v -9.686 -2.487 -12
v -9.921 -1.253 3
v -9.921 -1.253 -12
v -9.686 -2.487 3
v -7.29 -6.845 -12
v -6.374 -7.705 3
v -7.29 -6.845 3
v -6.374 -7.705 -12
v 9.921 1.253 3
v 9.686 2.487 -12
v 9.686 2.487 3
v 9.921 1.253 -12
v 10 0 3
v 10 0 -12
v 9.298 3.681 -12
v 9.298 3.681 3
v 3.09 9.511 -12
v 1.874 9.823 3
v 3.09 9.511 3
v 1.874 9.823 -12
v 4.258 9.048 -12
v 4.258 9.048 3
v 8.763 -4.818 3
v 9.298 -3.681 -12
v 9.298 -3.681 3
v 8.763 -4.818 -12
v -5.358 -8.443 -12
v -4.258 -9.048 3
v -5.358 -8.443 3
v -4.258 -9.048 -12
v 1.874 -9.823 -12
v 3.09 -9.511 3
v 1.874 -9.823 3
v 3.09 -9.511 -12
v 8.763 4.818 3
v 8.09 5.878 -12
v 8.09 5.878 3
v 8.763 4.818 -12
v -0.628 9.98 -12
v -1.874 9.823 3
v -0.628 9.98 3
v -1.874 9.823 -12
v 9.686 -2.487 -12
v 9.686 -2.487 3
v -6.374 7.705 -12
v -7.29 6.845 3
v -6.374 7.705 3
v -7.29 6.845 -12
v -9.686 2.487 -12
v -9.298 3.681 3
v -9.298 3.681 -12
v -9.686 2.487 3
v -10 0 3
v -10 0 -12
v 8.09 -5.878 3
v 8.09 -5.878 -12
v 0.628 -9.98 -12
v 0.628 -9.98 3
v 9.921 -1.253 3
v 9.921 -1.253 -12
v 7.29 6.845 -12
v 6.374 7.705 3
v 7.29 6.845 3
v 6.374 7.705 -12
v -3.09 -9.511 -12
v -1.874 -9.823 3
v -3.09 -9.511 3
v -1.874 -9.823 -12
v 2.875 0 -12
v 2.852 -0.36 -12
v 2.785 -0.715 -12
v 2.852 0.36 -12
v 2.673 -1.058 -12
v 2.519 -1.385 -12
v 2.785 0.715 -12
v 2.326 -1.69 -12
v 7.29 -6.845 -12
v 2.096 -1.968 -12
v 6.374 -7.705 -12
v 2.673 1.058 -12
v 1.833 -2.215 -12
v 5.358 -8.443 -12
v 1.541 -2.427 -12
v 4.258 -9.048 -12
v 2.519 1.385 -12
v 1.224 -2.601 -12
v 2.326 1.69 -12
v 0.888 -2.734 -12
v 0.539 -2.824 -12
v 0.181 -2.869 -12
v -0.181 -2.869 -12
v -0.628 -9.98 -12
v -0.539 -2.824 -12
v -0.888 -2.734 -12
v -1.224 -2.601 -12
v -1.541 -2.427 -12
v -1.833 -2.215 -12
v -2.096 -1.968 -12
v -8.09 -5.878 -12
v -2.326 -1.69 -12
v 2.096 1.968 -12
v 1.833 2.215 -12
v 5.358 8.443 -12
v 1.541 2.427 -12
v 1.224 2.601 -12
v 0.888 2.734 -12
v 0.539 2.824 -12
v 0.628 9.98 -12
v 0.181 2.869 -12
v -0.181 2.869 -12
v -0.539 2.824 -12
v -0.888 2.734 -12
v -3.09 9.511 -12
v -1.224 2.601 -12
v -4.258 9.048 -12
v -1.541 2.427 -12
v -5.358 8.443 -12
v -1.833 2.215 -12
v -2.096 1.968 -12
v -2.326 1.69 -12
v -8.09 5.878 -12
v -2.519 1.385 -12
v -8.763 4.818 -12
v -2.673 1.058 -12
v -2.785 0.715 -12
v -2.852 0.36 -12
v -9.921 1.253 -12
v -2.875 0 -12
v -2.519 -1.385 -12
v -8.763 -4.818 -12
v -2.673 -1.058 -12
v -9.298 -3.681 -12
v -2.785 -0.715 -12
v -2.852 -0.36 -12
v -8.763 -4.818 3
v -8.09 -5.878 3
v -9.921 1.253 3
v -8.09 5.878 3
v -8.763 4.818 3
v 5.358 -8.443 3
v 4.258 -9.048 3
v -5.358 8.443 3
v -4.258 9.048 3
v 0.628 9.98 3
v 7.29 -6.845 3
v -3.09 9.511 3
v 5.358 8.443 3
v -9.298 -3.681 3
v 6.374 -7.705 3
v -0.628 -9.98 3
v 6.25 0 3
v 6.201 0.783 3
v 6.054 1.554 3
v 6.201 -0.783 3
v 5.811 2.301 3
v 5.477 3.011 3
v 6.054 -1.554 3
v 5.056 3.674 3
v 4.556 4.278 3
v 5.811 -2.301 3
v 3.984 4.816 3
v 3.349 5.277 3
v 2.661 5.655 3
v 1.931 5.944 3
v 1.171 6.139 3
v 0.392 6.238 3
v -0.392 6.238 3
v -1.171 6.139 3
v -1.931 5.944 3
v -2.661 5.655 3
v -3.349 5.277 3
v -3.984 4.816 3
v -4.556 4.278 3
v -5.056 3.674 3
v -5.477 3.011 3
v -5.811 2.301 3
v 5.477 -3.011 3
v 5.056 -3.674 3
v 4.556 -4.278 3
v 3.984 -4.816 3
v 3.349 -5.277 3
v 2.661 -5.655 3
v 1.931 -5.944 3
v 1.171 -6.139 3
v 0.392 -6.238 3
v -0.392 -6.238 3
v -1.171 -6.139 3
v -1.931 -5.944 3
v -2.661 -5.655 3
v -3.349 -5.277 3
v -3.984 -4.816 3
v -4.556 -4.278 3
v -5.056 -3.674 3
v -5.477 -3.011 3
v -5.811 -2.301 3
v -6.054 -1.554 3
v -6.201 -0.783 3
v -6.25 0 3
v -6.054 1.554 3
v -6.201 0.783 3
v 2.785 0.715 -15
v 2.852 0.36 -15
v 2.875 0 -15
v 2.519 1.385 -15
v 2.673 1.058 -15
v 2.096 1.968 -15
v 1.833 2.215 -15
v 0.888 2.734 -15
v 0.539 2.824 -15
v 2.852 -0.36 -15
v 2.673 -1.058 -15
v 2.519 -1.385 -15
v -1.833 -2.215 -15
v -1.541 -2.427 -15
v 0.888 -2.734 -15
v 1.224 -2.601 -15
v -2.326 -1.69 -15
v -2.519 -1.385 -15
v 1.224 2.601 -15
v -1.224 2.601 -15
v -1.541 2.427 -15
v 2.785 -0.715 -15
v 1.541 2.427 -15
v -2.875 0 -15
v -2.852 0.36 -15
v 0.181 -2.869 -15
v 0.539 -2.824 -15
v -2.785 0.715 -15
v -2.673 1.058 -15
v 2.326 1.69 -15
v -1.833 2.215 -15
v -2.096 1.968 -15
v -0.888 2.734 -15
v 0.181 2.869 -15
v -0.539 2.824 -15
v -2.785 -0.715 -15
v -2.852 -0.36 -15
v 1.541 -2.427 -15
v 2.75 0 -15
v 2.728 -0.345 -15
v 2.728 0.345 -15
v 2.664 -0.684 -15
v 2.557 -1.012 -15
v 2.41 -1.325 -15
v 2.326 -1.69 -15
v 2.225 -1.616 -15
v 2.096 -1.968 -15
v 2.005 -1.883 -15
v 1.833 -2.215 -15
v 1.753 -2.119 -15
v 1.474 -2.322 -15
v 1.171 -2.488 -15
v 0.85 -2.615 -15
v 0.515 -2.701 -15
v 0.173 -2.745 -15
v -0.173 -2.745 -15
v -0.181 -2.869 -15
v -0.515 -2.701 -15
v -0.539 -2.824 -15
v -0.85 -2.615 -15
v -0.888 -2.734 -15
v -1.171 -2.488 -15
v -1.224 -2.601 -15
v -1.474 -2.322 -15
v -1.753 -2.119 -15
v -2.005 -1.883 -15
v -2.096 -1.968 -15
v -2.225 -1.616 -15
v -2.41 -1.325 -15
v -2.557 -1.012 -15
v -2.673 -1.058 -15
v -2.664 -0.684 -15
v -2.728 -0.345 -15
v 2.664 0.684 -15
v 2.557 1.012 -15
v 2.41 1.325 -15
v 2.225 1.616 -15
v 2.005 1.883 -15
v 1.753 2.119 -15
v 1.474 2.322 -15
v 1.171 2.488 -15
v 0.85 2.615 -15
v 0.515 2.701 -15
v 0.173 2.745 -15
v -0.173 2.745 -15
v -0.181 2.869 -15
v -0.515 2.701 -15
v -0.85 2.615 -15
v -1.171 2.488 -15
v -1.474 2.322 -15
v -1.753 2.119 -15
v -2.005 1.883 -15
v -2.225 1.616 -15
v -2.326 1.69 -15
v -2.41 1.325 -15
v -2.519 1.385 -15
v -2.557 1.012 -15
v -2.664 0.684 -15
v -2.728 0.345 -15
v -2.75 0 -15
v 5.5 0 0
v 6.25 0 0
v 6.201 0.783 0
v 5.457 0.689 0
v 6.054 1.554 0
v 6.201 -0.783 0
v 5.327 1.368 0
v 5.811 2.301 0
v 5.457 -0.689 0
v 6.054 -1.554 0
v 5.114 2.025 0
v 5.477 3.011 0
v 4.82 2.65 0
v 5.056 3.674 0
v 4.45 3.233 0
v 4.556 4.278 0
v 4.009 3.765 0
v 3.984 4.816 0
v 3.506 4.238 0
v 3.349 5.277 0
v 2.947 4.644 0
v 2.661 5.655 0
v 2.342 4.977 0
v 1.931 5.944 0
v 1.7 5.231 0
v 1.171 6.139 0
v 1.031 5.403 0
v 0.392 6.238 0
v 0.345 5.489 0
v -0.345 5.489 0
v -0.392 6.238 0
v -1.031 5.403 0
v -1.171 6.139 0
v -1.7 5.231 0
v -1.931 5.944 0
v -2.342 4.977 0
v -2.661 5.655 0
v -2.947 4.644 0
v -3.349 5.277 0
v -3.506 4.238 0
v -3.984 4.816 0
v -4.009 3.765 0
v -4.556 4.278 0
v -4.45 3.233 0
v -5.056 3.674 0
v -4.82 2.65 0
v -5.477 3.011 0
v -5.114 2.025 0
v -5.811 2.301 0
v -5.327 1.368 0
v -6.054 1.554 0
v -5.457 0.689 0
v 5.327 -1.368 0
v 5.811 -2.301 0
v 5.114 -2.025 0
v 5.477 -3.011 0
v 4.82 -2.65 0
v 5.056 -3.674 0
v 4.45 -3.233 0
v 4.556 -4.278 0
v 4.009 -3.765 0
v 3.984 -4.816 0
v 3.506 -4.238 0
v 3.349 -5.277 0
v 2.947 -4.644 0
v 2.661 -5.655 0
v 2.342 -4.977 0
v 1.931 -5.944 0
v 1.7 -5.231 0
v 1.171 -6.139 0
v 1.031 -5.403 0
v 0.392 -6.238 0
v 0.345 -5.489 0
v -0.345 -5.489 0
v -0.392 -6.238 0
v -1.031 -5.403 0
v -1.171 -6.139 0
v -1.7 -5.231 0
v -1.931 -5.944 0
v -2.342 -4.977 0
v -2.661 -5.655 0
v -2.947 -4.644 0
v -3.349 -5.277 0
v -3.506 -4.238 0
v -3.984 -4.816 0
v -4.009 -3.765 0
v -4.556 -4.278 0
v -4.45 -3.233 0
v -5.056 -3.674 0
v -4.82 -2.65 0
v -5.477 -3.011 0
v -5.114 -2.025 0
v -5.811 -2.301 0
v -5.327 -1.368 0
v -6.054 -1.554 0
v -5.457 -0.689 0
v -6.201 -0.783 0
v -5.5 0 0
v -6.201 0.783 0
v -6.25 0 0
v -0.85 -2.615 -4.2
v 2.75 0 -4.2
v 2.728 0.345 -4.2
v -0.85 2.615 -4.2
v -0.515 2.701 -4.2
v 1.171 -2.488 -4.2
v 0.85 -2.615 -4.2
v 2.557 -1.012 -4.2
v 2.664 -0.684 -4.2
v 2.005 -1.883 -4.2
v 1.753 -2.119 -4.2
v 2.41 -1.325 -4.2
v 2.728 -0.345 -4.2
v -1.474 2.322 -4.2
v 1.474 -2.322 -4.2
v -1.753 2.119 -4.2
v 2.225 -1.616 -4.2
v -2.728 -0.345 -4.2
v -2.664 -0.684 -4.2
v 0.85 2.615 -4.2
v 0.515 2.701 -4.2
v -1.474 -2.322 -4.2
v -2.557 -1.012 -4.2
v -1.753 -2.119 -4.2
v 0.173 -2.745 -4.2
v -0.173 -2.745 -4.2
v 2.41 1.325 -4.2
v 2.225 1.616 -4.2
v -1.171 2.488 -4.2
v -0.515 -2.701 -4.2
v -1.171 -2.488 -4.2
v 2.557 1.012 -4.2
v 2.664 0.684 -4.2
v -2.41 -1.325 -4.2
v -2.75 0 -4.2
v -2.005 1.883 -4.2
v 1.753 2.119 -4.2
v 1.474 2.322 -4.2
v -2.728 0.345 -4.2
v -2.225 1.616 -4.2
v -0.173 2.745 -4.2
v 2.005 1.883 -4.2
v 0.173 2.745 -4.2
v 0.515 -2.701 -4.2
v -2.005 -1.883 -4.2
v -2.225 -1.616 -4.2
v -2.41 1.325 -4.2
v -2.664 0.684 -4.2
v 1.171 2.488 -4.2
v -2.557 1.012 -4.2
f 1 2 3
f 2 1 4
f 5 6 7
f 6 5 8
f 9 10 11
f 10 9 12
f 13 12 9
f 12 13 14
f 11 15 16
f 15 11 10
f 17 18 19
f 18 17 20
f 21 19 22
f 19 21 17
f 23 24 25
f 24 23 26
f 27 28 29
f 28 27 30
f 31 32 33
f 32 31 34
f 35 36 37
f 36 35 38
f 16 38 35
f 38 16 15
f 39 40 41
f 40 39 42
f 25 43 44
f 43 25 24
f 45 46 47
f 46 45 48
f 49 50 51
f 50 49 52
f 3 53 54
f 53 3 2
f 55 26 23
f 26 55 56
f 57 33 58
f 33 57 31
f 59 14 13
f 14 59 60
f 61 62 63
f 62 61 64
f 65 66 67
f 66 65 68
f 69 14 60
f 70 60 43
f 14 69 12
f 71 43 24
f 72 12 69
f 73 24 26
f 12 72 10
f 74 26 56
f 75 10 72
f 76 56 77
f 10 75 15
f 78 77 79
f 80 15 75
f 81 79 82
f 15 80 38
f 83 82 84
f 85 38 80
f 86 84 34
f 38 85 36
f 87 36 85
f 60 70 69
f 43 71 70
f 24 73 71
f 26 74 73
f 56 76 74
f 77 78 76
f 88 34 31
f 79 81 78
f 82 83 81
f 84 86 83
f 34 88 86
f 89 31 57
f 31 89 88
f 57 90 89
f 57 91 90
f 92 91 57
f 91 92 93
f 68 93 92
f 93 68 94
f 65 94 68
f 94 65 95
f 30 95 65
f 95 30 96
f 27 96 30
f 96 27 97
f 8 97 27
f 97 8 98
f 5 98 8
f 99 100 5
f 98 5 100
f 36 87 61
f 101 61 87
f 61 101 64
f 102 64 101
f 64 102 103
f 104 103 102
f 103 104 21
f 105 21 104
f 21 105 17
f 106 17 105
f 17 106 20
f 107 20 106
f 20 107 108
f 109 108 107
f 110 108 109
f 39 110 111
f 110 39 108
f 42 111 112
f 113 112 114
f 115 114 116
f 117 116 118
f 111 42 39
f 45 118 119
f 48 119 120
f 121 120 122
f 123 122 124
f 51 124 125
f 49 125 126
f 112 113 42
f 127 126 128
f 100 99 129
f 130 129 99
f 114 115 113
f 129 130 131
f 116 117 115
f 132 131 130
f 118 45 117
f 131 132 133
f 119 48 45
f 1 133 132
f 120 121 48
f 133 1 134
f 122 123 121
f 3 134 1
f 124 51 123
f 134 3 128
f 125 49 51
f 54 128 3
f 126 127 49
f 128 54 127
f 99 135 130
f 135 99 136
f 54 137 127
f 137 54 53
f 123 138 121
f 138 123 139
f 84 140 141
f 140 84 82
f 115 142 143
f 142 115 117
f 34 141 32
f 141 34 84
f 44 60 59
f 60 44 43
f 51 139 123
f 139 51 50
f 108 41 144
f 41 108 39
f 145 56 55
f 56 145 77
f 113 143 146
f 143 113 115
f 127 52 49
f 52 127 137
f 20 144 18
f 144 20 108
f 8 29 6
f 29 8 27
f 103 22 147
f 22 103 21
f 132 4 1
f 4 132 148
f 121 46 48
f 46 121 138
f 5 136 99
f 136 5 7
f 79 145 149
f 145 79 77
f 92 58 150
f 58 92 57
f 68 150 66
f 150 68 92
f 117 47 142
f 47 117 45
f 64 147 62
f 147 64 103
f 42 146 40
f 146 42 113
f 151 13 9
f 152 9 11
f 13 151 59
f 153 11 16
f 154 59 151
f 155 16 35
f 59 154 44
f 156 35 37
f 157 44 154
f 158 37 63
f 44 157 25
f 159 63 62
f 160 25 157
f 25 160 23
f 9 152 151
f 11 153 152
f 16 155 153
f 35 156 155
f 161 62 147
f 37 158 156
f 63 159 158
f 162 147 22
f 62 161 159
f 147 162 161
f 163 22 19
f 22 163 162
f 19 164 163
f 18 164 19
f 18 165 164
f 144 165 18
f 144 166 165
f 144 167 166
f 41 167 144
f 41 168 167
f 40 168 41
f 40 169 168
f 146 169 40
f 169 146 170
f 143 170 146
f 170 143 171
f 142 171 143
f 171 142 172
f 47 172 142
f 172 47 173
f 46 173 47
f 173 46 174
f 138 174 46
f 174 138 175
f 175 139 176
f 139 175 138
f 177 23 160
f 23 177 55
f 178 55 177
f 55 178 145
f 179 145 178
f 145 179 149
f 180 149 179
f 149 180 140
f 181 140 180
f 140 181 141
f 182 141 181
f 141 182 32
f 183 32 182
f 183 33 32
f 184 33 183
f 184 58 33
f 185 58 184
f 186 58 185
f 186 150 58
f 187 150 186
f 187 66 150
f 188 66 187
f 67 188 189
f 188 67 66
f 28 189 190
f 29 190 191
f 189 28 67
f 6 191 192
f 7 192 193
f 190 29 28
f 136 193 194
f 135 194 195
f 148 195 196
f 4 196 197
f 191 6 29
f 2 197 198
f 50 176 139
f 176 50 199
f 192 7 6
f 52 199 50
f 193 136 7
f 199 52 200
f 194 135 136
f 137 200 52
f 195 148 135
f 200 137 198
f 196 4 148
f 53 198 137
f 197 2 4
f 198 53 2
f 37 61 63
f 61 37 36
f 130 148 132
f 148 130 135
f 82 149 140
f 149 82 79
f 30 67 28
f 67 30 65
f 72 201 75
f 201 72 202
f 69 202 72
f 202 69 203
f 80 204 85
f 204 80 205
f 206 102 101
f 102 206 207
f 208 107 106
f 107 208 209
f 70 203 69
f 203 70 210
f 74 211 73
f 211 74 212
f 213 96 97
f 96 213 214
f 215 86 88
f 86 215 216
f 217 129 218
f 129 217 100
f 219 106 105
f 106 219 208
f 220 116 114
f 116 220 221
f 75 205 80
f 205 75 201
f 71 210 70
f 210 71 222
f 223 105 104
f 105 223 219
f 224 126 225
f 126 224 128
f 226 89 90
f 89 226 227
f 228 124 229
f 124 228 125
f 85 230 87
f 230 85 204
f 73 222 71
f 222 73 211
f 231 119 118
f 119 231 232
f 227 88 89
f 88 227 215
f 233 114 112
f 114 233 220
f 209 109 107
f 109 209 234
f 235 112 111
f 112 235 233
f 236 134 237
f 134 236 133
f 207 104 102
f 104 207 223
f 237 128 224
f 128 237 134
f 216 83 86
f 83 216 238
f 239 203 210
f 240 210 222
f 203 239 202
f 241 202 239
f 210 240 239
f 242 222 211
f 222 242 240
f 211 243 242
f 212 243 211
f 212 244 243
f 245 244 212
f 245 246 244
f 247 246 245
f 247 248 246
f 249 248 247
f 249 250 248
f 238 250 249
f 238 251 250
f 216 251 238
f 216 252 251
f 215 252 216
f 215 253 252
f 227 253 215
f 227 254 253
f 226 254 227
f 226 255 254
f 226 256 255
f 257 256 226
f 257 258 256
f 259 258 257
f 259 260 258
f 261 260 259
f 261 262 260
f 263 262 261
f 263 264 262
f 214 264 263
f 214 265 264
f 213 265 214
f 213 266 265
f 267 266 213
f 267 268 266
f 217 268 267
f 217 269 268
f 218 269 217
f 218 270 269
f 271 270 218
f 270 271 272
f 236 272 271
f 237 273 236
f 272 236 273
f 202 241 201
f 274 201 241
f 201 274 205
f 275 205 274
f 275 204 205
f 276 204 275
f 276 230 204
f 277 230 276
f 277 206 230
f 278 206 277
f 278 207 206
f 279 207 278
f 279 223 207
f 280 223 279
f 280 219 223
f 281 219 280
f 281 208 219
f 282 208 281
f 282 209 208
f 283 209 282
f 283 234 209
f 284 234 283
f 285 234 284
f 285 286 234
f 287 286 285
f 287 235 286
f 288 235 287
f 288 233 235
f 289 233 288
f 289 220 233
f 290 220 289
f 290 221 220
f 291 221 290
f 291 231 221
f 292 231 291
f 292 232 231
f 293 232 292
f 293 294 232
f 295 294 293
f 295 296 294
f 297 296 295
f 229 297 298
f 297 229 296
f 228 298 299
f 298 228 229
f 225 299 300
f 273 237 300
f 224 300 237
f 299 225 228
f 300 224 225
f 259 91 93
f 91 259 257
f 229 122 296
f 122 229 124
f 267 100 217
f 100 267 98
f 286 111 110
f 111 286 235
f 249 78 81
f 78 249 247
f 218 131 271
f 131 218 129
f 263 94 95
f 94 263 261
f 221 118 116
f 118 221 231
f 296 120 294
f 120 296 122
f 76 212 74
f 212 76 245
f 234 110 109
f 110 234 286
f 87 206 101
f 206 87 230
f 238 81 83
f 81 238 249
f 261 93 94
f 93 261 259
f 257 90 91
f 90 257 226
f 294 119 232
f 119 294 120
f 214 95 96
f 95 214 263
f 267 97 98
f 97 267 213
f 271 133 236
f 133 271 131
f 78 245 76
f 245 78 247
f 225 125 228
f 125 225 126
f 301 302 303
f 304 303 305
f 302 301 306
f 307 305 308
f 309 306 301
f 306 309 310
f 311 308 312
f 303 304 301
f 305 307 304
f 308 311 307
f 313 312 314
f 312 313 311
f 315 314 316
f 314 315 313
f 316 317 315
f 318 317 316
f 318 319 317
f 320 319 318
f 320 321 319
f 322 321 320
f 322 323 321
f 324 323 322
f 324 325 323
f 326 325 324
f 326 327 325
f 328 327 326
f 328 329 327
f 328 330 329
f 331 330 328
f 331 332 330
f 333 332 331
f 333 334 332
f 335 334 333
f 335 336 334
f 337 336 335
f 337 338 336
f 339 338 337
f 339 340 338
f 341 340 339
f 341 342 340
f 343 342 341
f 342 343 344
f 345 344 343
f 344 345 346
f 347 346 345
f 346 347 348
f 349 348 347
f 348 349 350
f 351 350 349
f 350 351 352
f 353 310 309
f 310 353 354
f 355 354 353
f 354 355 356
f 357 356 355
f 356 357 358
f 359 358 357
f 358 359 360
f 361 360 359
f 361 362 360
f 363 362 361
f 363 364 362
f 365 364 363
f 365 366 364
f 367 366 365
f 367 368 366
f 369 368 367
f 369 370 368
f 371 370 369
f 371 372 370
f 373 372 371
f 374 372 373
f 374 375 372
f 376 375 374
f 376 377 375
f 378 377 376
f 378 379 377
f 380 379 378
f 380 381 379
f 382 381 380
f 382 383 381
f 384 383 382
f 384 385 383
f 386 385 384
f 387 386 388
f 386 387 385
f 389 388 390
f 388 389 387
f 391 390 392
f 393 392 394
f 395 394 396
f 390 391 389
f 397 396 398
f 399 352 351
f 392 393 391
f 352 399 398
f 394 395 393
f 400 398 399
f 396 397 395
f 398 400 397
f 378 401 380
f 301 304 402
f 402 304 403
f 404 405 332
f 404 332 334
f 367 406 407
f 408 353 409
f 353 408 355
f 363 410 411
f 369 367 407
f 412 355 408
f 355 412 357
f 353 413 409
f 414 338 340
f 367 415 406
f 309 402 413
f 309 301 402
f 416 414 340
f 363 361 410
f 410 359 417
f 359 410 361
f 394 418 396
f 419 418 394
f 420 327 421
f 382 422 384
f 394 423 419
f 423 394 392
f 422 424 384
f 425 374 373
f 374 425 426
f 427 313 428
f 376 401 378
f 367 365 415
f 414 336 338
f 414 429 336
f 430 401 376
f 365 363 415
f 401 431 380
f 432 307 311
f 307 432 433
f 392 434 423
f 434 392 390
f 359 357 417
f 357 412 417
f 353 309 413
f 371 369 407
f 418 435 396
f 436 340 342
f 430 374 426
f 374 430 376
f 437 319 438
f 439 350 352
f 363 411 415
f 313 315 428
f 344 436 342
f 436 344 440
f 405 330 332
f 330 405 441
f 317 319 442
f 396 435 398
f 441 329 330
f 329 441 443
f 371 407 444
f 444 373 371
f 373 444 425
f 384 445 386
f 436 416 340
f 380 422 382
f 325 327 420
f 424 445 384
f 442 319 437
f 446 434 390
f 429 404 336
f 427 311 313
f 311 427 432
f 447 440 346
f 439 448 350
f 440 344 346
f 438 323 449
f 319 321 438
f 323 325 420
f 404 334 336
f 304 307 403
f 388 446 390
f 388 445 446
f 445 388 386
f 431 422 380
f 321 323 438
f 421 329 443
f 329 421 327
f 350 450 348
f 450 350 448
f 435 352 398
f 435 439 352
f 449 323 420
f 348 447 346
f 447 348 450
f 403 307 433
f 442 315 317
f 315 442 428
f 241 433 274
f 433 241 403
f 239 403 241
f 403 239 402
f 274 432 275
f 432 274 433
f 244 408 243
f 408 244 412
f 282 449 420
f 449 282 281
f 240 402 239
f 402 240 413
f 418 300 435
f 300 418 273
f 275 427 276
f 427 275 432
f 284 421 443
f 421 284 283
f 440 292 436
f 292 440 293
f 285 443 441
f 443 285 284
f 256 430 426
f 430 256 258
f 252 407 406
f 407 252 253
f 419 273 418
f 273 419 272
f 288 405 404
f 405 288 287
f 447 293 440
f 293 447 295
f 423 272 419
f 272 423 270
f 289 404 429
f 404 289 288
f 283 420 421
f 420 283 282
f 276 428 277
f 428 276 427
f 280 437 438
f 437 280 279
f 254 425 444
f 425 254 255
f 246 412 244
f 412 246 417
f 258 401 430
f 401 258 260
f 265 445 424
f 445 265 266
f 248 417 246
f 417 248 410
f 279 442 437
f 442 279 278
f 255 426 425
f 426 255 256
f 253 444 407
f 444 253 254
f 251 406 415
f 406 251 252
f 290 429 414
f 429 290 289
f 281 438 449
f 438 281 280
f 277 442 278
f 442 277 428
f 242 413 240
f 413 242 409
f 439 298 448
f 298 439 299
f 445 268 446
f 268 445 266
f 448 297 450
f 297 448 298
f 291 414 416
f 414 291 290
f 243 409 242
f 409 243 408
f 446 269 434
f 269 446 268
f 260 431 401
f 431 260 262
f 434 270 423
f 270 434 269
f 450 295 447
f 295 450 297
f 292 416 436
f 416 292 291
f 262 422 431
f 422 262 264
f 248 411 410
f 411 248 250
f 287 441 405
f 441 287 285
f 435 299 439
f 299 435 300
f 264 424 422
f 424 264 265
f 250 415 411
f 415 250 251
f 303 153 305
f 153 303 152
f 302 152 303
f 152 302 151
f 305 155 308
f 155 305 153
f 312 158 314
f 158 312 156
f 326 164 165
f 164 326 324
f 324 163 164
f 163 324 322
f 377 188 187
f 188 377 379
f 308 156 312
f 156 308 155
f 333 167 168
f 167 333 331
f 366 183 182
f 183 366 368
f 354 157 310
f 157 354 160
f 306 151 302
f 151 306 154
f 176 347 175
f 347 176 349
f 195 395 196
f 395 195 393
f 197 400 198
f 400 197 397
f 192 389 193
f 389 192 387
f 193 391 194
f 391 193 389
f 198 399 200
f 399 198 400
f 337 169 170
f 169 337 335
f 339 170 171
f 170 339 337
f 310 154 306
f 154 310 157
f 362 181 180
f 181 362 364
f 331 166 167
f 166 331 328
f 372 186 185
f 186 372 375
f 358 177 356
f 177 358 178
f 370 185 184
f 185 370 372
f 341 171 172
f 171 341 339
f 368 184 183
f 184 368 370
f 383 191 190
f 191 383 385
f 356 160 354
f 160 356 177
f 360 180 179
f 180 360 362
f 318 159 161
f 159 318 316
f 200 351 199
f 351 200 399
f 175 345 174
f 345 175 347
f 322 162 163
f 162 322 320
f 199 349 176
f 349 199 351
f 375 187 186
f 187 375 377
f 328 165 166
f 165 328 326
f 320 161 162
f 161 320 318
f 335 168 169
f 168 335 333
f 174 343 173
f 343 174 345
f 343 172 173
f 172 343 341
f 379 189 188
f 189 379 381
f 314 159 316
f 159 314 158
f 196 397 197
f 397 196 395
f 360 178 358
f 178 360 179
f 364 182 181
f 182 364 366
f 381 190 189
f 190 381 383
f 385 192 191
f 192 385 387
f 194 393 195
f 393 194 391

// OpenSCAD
$fn = 50;

difference() {
	union() {
		translate(v = [0, 0, -12.0]) {
			cylinder(h = 15, r = 10.0);
		}
		#translate(v = [0, 0, -15.0]) {
			cylinder(h = 15, r = 2.875);
		}
	}
	union() {
		translate(v = [0, 0, 0]) {
			rotate(a = [0, 0, 0]) {
				difference() {
					union() {
						translate(v = [0, 0, -15.0]) {
							cylinder(h = 15, r = 2.25);
						}
						translate(v = [0, 0, -4.2]) {
							cylinder(h = 4.2, r1 = 2.75, r2 = 5.5);
						}
						translate(v = [0, 0, -15.0]) {
							cylinder(h = 15, r = 2.75);
						}
						translate(v = [0, 0, -15.0]) {
							cylinder(h = 15, r = 2.25);
						}
					}
					union();
				}
			}
		}
		#cylinder(h = 3, r = 6.25);
	}
}
